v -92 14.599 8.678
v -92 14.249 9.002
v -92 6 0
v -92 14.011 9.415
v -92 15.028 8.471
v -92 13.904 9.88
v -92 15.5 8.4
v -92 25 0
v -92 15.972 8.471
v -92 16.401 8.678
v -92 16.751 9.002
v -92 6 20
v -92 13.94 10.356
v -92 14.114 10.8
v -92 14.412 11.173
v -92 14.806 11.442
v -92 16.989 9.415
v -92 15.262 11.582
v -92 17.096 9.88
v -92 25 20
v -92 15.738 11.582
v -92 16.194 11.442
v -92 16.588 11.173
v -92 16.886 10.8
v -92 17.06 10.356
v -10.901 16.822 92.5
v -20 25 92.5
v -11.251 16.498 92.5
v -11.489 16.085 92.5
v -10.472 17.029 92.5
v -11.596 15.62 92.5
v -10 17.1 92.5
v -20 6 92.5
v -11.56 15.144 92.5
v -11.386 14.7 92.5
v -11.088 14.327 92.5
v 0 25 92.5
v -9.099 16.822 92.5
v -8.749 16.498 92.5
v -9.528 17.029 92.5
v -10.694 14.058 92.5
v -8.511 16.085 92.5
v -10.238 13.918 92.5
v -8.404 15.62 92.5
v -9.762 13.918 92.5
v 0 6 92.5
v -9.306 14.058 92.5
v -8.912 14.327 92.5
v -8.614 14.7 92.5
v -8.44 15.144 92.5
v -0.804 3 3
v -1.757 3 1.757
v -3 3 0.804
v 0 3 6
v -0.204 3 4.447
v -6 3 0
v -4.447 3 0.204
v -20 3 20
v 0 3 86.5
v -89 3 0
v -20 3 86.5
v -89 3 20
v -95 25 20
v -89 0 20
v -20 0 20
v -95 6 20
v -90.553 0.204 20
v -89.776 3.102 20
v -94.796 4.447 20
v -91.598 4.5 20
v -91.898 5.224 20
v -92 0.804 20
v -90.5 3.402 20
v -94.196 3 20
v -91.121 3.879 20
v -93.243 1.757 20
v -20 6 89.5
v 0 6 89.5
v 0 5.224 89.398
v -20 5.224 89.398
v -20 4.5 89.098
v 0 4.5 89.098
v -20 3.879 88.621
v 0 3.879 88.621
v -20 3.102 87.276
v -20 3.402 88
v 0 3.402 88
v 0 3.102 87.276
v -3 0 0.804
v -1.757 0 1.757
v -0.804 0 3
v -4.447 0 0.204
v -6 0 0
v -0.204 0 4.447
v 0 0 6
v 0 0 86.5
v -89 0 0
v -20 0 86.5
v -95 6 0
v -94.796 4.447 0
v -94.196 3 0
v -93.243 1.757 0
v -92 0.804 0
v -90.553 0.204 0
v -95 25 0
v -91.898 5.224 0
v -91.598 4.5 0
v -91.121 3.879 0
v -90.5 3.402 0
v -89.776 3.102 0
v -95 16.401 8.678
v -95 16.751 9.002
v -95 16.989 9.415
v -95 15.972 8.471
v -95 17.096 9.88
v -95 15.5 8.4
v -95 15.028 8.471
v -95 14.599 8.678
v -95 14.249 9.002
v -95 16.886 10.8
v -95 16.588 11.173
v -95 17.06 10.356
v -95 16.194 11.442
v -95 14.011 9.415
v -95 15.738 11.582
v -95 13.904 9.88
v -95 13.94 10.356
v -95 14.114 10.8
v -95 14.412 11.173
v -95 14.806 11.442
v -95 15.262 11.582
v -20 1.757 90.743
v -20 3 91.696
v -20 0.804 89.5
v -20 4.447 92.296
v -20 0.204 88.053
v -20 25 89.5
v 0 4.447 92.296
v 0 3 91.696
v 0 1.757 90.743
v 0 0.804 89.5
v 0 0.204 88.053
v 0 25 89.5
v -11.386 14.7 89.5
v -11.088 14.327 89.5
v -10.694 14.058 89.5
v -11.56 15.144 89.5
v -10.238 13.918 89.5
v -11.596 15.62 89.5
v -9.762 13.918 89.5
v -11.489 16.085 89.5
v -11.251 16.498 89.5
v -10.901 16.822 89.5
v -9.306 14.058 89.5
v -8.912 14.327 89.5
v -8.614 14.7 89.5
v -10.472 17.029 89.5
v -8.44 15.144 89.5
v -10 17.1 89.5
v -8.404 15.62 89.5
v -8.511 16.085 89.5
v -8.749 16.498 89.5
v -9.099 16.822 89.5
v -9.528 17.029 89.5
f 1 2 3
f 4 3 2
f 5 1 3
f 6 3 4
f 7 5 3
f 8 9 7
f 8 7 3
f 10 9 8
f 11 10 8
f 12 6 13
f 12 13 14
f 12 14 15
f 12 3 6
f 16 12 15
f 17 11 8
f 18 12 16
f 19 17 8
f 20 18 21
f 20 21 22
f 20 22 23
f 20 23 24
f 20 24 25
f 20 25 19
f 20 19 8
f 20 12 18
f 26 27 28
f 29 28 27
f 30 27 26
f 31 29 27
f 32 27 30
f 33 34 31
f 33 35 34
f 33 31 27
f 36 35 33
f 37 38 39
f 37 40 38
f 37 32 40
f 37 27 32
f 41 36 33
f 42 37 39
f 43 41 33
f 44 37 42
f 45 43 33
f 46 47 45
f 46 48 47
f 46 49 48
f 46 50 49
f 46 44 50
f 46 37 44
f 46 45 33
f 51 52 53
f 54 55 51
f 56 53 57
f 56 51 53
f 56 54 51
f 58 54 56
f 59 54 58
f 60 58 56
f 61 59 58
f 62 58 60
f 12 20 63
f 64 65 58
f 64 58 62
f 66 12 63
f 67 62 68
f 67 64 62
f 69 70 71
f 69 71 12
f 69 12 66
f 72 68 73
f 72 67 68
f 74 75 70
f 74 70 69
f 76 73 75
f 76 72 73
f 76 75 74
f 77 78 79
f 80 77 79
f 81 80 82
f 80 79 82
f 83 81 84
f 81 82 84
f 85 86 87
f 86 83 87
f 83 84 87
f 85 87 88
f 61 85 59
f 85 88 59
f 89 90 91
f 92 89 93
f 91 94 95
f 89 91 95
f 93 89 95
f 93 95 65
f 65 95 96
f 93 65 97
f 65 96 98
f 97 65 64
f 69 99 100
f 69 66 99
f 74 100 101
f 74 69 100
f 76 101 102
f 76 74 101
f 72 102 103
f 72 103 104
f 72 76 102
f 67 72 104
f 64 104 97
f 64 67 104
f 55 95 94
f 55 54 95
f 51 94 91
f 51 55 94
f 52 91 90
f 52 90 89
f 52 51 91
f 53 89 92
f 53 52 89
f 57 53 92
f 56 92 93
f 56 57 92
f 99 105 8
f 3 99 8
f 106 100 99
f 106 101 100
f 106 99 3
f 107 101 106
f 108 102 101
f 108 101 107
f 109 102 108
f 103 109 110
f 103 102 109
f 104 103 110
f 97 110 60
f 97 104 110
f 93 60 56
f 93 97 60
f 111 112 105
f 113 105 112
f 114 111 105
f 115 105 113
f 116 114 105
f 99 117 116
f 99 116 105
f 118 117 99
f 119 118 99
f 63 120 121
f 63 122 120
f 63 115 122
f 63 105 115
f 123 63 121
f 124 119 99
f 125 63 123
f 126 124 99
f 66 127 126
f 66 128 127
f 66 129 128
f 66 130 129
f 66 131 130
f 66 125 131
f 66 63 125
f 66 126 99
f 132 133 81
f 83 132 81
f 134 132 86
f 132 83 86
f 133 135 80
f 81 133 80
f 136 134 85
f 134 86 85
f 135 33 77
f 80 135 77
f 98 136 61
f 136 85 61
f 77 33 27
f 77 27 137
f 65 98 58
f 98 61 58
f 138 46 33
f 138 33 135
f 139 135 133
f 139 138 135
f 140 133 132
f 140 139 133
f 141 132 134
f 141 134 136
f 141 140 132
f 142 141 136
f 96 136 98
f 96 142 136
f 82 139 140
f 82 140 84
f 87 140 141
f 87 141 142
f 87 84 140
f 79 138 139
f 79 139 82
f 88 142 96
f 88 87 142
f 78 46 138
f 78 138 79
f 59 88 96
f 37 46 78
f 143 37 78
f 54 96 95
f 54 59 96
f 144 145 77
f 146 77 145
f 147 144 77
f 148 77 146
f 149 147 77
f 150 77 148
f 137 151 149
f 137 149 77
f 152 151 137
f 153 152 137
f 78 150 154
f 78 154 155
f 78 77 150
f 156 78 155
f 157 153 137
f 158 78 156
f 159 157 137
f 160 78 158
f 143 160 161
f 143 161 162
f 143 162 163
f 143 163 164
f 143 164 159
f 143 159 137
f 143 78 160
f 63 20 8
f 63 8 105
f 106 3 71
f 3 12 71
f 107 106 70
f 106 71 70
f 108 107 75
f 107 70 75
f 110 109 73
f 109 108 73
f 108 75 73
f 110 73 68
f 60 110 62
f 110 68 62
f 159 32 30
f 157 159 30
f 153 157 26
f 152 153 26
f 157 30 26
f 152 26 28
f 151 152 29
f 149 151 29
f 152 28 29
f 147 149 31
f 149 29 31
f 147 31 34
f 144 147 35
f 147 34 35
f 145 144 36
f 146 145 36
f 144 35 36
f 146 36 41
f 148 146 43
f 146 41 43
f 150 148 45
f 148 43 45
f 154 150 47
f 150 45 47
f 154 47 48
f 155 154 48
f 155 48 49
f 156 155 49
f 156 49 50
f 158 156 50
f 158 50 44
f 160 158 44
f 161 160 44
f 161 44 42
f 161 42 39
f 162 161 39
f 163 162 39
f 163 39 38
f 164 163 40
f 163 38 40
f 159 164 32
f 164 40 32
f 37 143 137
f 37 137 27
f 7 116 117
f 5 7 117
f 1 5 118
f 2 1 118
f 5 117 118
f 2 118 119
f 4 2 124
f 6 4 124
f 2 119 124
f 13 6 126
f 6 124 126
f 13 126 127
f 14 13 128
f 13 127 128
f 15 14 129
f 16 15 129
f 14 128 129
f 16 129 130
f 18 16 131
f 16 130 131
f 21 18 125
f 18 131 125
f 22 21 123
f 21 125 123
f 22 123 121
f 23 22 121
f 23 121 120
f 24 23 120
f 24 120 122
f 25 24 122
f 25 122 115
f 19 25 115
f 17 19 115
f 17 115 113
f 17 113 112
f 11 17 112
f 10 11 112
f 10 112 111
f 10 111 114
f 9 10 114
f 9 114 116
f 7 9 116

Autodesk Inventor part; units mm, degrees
ref_plane "YZ Plane" through (0, 0, 0) normal (1, 0, 0) x (0, 1, 0)
ref_plane "XZ Plane" through (0, 0, 0) normal (0, 1, 0) x (-1, 0, 0)
ref_plane "XY Plane" through (0, 0, 0) normal (0, 0, 1) x (1, 0, 0)
sketch "草圖1" plane through (0, 0, 0) normal (0, 1, 0) x (-1, 0, 0)
  line L0 (0, 0) -> (0, 92.5)
  line L1 (0, 92.5) -> (20, 92.5)
  line L2 (20, 92.5) -> (20, 20)
  line L3 (20, 20) -> (95, 20)
  line L4 (95, 20) -> (95, 0)
  line L5 (95, 0) -> (0, 0)
  dimension "d0" = 92.5
  dimension "d1" = 95
  dimension "d2" = 20
  dimension "d3" = 20
extrude "平板1" add sketch "草圖1" along normal blind 3
fillet "轉角外圓角1" radius 6 1 edges at (0, 1.5, 0)
sketch "草圖2" plane through (0, 0, 89.5) normal (0, 0, 1) x (1, 0, 0)
  line L0 (-20, 0) -> (0, 0)
  line L1 (0, 0) -> (0, 25)
  line L2 (0, 25) -> (-20, 25)
  line L3 (-20, 25) -> (-20, 0)
edge flange "凸緣1" height 25 angle 90 thickness 3 bend radius 3 thickness toward (0, 0, 1) relief tear relief width 3 relief depth 1.5 corner gap 3 corner form 0 edges at (-10, 3, 92.5) (-95, 3, 10) wall of the first edge with corners at (-20, 0, 89.5) (0, 0, 89.5) (0, 25, 89.5) (-20, 25, 89.5)
bend "折彎1"
corner "轉角1"
sketch "草圖3" plane through (-92, 25, 20) normal (1, 0, 0) x (0, 0, -1)
  line L0 (20, 0) -> (0, 0) projected
  line L1 (20, -19) -> (20, 0) projected
  point P0 (20, -25)
  point P1 (10, -9.5)
  point P2 (10, 0)
  point P3 (20, -9.5)
hole "孔1" at (-92, 15.5, 10) direction (-1, 0, 0) diameter 3.2 end through all
sketch "草圖4" plane through (0, 25, 89.5) normal (0, 0, -1) x (-1, 0, 0)
  line L0 (20, 0) -> (0, 0) projected
  line L1 (20, -19) -> (20, 0) projected
  point P0 (0, -25)
  point P1 (10, -9.5)
  point P2 (10, 0)
  point P3 (20, -9.5)
hole "孔2" at (-10, 15.5, 89.5) direction (0, 0, 1) diameter 3.2 end through all
equation "\"d21\" = 厚度"
equation "\"d28\" = 厚度"
equation "\"d4\" = 厚度"
equation "\"d6\" = 折彎離隙寬度"
equation "\"d7\" = 折彎離隙深度"
equation "\"d8\" = 最小剩餘"
equation "\"d9\" = 轉移半徑"
equation "\"d12\" = 折彎半徑"
equation "\"d13\" = 轉角離隙大小"
equation "\"d14\" = 間隙大小"
equation "\"d15\" = Jacobi半徑大小"
equation "\"折彎半徑\" = 厚度"
equation "\"折彎離隙寬度\" = 厚度"
equation "\"折彎離隙深度\" = 0.5 * 厚度"
equation "\"轉角離隙大小\" = 4 * 厚度"
equation "\"最小剩餘\" = 2 * 厚度"
equation "\"轉移半徑\" = 折彎半徑"
equation "\"Jacobi半徑大小\" = 折彎半徑"
equation "\"間隙大小\" = 厚度"
equation "\"厚度\" = 3"
properties part number "鋁擠加強肋"
